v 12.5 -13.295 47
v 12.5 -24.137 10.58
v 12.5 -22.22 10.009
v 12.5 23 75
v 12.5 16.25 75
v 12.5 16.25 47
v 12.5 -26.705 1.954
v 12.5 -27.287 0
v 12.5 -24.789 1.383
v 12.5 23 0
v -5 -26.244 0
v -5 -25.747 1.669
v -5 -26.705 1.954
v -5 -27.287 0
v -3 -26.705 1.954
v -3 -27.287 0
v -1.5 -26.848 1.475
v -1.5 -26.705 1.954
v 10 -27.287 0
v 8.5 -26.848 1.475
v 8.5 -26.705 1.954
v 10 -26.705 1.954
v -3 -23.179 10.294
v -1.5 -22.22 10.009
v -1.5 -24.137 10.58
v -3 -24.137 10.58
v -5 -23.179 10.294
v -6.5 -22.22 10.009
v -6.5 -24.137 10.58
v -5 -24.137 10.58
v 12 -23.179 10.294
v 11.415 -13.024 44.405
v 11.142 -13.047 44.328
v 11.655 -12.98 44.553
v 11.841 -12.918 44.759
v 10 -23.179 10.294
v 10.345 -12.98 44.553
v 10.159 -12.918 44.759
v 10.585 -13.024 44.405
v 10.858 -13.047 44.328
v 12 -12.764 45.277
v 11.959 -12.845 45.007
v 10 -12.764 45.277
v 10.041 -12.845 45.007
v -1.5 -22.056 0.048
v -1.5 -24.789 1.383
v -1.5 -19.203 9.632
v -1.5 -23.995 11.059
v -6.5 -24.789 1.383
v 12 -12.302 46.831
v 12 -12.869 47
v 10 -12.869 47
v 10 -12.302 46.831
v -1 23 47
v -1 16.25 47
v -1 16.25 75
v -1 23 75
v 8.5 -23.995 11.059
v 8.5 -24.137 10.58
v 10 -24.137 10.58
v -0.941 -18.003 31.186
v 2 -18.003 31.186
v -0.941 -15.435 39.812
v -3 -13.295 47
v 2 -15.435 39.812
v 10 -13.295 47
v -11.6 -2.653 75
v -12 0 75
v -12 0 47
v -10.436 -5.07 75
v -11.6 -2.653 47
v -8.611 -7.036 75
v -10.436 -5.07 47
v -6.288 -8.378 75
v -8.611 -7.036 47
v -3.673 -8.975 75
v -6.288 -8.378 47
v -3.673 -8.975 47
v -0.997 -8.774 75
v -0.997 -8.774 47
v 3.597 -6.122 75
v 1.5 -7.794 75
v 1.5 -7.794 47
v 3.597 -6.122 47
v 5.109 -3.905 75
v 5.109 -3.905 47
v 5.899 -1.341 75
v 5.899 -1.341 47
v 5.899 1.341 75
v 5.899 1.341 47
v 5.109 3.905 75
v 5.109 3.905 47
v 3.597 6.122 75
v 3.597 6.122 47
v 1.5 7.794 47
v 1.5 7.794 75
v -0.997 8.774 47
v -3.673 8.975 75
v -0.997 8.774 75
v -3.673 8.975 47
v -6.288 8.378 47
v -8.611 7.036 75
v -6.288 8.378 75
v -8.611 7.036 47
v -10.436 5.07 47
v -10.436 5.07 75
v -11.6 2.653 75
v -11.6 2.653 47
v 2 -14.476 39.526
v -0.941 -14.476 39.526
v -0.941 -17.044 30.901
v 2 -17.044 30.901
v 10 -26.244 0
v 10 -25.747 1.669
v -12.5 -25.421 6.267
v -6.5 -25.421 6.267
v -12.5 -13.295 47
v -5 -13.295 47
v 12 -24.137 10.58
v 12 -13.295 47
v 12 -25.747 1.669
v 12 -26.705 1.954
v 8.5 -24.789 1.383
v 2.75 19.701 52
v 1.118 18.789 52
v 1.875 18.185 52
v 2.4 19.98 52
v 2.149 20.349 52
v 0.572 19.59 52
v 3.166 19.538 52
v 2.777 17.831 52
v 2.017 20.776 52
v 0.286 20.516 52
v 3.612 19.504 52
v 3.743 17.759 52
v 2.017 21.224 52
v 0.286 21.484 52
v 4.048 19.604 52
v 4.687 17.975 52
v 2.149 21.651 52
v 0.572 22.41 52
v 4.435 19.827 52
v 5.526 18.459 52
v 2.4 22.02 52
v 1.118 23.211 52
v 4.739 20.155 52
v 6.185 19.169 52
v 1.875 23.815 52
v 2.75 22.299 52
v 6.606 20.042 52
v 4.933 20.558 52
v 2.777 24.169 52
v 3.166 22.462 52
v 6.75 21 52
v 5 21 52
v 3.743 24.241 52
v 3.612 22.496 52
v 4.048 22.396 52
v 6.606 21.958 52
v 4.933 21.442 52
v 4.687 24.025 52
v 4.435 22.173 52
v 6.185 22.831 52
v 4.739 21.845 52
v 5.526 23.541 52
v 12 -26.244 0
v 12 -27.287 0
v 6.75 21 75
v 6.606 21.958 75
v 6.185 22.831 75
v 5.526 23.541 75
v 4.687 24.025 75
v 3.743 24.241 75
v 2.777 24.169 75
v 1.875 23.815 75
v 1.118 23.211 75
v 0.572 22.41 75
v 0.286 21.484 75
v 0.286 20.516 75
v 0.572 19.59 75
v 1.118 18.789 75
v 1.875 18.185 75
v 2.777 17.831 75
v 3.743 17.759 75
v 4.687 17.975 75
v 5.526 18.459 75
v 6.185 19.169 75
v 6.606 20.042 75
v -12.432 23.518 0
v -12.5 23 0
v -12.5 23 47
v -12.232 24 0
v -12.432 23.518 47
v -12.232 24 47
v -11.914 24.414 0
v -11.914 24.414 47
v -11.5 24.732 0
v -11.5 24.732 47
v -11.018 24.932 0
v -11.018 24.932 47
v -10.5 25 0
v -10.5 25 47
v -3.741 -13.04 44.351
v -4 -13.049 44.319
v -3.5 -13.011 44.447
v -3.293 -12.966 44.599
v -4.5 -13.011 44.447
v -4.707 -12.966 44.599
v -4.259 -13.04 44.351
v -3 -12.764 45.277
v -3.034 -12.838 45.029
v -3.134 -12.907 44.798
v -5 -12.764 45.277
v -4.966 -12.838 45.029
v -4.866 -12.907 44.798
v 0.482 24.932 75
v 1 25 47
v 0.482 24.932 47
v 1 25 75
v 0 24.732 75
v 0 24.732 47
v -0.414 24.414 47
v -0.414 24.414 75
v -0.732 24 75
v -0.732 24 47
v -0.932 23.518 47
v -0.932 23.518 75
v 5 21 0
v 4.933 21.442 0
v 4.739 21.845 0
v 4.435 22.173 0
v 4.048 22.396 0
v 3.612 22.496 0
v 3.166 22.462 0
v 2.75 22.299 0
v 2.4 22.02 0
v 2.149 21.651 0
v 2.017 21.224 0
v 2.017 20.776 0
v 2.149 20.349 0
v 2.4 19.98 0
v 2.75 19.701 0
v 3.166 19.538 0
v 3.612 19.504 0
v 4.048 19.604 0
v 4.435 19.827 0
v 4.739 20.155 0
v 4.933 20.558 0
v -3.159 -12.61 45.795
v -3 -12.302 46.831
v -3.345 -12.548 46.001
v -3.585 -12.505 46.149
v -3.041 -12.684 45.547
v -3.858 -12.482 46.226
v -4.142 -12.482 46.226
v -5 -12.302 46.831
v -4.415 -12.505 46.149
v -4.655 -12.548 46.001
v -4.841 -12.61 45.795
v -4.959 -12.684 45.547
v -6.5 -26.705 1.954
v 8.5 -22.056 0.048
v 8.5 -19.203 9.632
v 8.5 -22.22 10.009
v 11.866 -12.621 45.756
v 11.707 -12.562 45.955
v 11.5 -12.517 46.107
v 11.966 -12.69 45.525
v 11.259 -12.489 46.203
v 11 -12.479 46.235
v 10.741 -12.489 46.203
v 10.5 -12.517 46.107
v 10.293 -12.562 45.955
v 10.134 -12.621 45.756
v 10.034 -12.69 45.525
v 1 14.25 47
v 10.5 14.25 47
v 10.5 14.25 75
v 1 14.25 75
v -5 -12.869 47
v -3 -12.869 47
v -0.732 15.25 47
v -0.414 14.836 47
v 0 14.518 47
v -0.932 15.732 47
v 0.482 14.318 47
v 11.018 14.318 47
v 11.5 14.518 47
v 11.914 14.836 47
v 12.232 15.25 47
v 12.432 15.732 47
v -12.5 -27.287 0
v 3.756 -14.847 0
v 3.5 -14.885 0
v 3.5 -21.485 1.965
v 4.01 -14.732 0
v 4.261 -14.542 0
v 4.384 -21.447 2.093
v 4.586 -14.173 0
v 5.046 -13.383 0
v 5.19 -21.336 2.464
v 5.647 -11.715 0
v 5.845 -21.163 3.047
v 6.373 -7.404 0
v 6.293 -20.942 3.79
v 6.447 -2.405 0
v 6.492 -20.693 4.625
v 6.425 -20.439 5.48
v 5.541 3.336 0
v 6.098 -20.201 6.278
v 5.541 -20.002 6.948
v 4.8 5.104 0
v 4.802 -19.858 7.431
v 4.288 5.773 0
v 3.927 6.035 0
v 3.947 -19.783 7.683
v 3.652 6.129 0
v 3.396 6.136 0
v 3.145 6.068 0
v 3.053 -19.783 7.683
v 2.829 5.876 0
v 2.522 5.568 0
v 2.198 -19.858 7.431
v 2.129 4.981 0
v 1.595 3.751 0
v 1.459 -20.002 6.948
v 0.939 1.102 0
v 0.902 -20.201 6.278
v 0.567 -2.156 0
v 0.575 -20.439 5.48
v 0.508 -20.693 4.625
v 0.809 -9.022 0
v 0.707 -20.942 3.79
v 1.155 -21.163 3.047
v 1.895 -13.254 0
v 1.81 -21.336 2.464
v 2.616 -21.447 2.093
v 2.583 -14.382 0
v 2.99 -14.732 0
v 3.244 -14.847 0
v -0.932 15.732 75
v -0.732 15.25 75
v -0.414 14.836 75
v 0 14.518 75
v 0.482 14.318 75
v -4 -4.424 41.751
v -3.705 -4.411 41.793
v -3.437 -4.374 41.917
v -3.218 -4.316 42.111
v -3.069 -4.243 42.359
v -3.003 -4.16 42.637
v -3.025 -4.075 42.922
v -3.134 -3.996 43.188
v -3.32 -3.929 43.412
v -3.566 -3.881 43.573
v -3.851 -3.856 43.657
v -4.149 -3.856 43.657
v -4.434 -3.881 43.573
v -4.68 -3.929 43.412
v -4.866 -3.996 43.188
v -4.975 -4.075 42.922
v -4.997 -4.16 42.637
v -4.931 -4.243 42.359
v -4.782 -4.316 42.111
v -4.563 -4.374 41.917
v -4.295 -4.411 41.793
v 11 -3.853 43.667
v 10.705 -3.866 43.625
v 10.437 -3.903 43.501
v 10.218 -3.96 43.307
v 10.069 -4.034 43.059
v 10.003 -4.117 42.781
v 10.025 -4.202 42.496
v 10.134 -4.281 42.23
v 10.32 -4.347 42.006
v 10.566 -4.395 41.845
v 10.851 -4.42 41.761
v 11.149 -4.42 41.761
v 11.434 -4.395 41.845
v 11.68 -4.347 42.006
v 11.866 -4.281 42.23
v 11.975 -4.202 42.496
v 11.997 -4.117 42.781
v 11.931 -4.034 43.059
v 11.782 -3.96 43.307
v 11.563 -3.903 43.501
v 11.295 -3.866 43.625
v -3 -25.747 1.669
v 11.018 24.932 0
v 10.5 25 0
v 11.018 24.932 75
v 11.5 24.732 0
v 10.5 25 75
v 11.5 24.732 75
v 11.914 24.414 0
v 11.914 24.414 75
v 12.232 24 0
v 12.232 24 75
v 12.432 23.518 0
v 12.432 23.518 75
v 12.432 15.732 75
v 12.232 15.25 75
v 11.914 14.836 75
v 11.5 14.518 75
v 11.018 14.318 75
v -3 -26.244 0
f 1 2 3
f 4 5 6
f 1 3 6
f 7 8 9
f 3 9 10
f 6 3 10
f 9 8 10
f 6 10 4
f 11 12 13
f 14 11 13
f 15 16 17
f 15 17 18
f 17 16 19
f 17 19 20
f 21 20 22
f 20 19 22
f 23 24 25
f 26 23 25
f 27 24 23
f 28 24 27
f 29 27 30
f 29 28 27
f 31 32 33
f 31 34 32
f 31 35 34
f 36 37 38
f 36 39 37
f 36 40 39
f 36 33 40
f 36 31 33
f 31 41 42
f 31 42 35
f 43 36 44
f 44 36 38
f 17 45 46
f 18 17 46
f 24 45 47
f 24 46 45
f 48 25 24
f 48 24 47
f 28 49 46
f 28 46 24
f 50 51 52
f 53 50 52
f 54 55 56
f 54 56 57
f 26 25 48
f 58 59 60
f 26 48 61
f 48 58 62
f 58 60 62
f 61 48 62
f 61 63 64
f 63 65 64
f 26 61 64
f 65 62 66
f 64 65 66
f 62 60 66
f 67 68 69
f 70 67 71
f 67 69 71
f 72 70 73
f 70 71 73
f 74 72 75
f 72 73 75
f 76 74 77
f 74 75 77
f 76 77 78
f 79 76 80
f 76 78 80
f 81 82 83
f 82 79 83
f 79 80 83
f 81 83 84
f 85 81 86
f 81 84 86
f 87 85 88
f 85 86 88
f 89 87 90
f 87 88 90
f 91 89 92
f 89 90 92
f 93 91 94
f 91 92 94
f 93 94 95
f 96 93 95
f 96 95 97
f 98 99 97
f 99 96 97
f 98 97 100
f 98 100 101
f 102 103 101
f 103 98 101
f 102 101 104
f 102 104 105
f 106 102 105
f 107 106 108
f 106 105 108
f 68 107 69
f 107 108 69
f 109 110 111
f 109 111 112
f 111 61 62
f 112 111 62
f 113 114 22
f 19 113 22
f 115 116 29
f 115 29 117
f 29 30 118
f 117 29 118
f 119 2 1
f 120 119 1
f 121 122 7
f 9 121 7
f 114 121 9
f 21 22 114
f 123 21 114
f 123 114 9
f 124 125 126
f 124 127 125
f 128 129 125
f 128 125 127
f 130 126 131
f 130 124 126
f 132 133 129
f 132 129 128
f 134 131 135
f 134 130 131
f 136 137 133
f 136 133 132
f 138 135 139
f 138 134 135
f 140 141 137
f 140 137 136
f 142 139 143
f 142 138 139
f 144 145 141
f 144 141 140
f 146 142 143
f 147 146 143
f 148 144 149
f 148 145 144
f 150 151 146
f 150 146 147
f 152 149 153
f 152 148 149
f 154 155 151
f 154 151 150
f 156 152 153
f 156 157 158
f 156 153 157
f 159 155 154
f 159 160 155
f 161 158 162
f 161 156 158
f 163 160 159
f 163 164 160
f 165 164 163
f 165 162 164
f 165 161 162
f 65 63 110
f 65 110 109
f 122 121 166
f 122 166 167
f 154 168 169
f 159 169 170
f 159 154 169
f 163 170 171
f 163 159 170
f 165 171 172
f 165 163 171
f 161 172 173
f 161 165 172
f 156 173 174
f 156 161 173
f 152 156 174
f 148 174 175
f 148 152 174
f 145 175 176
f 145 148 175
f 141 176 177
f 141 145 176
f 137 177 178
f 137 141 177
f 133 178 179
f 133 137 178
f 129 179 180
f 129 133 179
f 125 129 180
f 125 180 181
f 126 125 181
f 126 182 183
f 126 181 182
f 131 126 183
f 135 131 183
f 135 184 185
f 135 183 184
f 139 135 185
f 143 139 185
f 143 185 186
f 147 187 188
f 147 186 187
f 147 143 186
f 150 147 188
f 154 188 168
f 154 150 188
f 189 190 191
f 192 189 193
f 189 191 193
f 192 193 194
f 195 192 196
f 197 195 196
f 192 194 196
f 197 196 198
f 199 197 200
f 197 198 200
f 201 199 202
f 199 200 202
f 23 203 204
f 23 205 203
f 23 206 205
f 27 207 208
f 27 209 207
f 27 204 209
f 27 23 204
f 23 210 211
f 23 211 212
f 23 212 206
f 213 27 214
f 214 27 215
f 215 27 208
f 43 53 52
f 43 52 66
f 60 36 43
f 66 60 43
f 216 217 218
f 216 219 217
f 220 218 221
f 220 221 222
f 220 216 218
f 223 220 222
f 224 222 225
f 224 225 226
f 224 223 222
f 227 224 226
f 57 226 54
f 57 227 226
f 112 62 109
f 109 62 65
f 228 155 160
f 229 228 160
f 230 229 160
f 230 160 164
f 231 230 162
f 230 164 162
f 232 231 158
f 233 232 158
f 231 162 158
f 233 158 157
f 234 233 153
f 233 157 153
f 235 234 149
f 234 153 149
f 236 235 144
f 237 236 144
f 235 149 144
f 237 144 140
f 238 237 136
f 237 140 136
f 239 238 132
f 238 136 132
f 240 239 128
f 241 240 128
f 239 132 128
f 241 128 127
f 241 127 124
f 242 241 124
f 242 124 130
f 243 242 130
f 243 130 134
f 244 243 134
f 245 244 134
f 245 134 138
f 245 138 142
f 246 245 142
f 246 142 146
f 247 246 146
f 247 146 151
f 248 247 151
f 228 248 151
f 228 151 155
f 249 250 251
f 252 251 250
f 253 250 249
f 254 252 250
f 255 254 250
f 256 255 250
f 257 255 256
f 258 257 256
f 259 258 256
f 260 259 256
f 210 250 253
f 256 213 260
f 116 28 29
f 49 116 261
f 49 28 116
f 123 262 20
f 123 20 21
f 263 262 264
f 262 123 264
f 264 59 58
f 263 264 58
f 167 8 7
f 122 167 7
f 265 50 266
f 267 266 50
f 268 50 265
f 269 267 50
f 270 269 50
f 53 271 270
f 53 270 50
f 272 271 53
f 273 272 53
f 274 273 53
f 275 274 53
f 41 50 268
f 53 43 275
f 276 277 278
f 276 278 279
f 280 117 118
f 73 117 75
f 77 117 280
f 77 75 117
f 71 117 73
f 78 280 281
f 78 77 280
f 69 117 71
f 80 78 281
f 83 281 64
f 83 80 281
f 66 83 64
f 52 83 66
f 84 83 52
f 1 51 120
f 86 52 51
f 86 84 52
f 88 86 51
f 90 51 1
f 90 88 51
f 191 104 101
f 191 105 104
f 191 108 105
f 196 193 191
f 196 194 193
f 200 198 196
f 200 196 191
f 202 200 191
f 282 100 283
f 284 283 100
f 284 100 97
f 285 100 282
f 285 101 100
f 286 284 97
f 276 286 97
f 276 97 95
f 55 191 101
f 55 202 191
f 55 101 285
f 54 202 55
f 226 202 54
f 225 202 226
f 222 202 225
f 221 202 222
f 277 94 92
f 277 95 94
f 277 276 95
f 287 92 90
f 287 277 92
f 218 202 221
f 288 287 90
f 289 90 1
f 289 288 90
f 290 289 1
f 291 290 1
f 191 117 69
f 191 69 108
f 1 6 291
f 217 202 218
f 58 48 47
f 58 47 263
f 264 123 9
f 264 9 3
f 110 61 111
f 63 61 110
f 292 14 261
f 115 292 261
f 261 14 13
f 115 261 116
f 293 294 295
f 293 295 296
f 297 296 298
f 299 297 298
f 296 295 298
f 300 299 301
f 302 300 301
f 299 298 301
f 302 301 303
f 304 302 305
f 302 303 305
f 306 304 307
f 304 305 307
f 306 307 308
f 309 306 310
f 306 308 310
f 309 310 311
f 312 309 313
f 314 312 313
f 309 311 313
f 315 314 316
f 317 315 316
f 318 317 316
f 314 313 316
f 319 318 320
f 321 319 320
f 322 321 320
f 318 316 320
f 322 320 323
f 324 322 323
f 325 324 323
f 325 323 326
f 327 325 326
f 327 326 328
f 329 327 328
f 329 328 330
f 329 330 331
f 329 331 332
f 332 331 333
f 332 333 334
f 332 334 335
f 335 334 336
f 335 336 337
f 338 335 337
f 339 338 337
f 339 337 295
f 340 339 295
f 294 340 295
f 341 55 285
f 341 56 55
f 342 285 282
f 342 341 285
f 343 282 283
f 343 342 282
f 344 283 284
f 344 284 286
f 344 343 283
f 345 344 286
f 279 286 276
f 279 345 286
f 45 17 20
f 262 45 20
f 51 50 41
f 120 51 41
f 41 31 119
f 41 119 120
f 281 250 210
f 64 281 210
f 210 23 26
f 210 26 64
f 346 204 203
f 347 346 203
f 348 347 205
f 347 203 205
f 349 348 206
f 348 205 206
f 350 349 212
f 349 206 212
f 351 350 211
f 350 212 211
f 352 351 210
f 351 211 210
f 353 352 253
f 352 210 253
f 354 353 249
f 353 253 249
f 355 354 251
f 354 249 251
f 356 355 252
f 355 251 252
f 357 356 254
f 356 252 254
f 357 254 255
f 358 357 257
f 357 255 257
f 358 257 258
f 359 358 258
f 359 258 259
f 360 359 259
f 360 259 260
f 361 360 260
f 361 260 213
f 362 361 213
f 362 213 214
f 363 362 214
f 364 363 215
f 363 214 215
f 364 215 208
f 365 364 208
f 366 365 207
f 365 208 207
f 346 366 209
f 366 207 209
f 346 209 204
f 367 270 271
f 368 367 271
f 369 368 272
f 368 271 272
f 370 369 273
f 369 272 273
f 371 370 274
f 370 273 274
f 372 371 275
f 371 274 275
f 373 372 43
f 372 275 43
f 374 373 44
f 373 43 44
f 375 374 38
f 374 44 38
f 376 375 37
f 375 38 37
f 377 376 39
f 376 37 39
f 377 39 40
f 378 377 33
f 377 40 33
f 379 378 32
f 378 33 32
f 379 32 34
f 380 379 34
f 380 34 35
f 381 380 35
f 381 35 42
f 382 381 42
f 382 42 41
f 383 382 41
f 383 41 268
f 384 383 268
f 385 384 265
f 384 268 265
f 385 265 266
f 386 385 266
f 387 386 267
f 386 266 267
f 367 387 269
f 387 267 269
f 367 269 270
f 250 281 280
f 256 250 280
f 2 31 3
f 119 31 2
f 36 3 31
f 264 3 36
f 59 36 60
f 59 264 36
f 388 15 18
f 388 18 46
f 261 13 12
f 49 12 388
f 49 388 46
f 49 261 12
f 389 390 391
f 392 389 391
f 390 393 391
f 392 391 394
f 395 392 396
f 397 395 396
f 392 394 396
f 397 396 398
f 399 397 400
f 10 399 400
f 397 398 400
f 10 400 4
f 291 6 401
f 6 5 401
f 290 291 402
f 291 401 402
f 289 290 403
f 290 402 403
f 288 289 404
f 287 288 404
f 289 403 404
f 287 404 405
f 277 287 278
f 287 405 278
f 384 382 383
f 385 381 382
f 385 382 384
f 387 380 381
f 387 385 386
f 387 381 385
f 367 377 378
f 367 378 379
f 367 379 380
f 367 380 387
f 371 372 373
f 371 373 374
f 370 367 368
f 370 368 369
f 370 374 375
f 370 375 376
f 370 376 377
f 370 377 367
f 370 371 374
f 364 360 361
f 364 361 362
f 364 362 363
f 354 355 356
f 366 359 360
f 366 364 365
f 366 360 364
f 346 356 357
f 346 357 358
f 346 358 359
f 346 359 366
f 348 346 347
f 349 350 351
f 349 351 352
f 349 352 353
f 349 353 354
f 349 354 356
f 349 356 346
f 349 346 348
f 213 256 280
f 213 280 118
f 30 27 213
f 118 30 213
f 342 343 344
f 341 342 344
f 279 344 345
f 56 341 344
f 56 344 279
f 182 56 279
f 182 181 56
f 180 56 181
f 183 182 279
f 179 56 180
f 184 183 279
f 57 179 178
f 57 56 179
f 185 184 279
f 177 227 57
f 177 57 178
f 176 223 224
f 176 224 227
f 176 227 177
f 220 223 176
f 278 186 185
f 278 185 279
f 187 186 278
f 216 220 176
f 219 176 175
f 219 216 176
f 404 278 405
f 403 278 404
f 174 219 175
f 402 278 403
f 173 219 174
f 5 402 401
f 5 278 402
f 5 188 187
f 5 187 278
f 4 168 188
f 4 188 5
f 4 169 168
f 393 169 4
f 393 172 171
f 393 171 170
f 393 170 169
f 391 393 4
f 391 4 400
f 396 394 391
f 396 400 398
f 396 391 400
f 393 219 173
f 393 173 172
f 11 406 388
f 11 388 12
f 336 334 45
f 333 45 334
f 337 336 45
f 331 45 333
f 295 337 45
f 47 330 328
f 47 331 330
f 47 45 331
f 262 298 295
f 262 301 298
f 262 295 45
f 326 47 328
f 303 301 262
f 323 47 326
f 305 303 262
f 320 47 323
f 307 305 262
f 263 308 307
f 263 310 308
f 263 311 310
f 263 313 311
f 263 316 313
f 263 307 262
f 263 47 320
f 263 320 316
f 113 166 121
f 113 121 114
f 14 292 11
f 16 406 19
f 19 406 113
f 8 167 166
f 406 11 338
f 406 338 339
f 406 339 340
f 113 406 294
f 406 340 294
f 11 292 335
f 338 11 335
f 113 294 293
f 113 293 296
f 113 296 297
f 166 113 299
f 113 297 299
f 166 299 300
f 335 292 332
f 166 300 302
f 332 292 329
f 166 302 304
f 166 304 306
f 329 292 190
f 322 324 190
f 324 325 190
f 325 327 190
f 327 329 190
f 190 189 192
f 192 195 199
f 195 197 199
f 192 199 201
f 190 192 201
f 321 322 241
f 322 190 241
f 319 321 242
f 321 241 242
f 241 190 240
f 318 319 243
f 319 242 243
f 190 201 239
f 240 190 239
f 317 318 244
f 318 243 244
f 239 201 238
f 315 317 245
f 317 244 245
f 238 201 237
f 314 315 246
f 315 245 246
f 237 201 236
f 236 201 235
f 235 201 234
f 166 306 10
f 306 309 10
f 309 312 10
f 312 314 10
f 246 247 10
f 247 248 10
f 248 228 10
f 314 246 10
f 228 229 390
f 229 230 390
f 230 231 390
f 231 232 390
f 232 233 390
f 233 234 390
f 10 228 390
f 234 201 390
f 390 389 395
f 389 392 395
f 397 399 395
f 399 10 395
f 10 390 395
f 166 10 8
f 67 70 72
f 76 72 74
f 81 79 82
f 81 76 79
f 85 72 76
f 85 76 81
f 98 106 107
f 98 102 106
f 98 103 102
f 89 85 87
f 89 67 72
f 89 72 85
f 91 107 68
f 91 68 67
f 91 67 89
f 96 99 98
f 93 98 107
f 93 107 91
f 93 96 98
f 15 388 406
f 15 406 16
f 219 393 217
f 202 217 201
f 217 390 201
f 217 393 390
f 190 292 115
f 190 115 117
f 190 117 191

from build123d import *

# Parameters (mm, degrees)
SKETCH_1_W               = 25
SKETCH_1_H               = 60
EXTRUDE_1_DEPTH          = 75
SKETCH_3_R               = 9
CUT_EXTRUDE_1_DEPTH      = 58.142366069
SKETCH_4_R               = 3.25
CUT_EXTRUDE_2_DEPTH      = 62.320877358
SKETCH_5_R               = 1.5
CUT_EXTRUDE_3_DEPTH      = 62.320877358
SKETCH_6_W               = 25
SKETCH_6_H               = 5
CUT_EXTRUDE_4_DEPTH      = 82.738913621
CUT_EXTRUDE_5_DEPTH      = 85.557672626
SKETCH_9_R               = 3
CUT_EXTRUDE_6_DEPTH      = 85.994924721
SKETCH_10_W              = 10
SKETCH_10_H              = 10
CUT_EXTRUDE_7_DEPTH      = 5
CUT_EXTRUDE_8_DEPTH      = 15
CUT_EXTRUDE_8_DEPTH_BACK = 5
SKETCH_12_R              = 1
CUT_EXTRUDE_9_DEPTH      = 10
SKETCH_14_W              = 2
SKETCH_14_H              = 1
CUT_EXTRUDE_10_DEPTH     = 49.16
SKETCH_15_W              = 2.940527474
SKETCH_15_H              = 9
CUT_EXTRUDE_11_DEPTH     = 1
FILLET_1_R               = 2


with BuildPart() as part:
    # Эскиз1 → Бобышка-Вытянуть1 (new body)
    with BuildSketch(Plane.XY):
        Rectangle(SKETCH_1_W, SKETCH_1_H)
    extrude(amount=EXTRUDE_1_DEPTH)

    # Эскиз3 → Вырез-Вытянуть1 (cut, through all)
    with BuildSketch(Plane.XY.offset(47)):
        Polygon((-12.5, -30), (12.5, -30), (12.5, 14.25), (-1, 14.25), (-1, 30), (-12.5, 30), align=None)
        with Locations(Location((-3, 0, 0), (0, 0, 180))):
            Circle(SKETCH_3_R, mode=Mode.SUBTRACT)
    extrude(amount=CUT_EXTRUDE_1_DEPTH, mode=Mode.SUBTRACT)

    # Эскиз4 → Вырез-Вытянуть2 (cut, through all)
    with BuildSketch(Plane.XY.offset(52)):
        with Locations((3.5, 21)):
            Circle(SKETCH_4_R)
    extrude(amount=CUT_EXTRUDE_2_DEPTH, mode=Mode.SUBTRACT)

    # Эскиз5 → Вырез-Вытянуть3 (cut, through all)
    with BuildSketch(Plane.XY.offset(52)):
        with Locations((3.5, 21)):
            Circle(SKETCH_5_R)
    extrude(amount=-CUT_EXTRUDE_3_DEPTH, mode=Mode.SUBTRACT)

    # Эскиз6 → Вырез-Вытянуть4 (cut, through all)
    with BuildSketch(Plane(origin=(0, 0, 0), x_dir=(-1, 0, 0), z_dir=(0, 0, -1))):
        with Locations((0, 27.5)):
            Rectangle(SKETCH_6_W, SKETCH_6_H)
    extrude(amount=-CUT_EXTRUDE_4_DEPTH, mode=Mode.SUBTRACT)

    # Эскиз8 → Вырез-Вытянуть5 (cut, through all)
    with BuildSketch(Plane(origin=(12.5, 0, 0), x_dir=(0, 0, -1), z_dir=(1, 0, 0))):
        Polygon((-6.266839037, -25.421365839), (-47, -13.294552658), (-47, -30), (0, -30), (0, -27.287088617), align=None)
    extrude(amount=-CUT_EXTRUDE_5_DEPTH, mode=Mode.SUBTRACT)

    # Эскиз9 → Вырез-Вытянуть6 (cut, through all)
    with BuildSketch(Plane(origin=(0, -25.065453583, 7.462324694), x_dir=(1, 0, 0), z_dir=(0, -0.9584273167859609, 0.2853367807319331))):
        with Locations(Location((3.5, -1.247340968, 0), (0, 0, 270))):
            Circle(SKETCH_9_R)
    extrude(amount=-CUT_EXTRUDE_6_DEPTH, mode=Mode.SUBTRACT)

    # Эскиз10 → Вырез-Вытянуть7 (cut)
    with BuildSketch(Plane(origin=(0, -25.065453583, 7.462324694), x_dir=(1, 0, 0), z_dir=(0, -0.9584273167859609, 0.2853367807319331))):
        with Locations((3.5, -1.247340968)):
            Rectangle(SKETCH_10_W, SKETCH_10_H)
    extrude(amount=-CUT_EXTRUDE_7_DEPTH, mode=Mode.SUBTRACT)

    # Эскиз11 → Вырез-Вытянуть8 (cut, two sides: drawn at the far end of the back side and taken through both)
    with BuildSketch(Plane(origin=(-1.5, 0, 0), x_dir=(0, 0, -1), z_dir=(1, 0, 0)).offset(-CUT_EXTRUDE_8_DEPTH_BACK)):
        Polygon((-10.579761962, -24.137350326), (-1.953916111, -26.705381353), (-1.38324255, -24.788526719), (-10.009088401, -22.220495692), align=None)
    extrude(amount=CUT_EXTRUDE_8_DEPTH + CUT_EXTRUDE_8_DEPTH_BACK, mode=Mode.SUBTRACT)

    # Эскиз12 → Вырез-Вытянуть9 (cut)
    with BuildSketch(Plane(origin=(0, -25.065453583, 7.462324694), x_dir=(1, 0, 0), z_dir=(0, -0.9584273167859609, 0.2853367807319331))):
        with Locations(Location((-4, 39.752659032, 0), (0, 0, 270))):
            Circle(SKETCH_12_R)
        with Locations(Location((11, 39.752659032, 0), (0, 0, 90))):
            Circle(SKETCH_12_R)
    extrude(amount=-CUT_EXTRUDE_9_DEPTH, mode=Mode.SUBTRACT)

    # Эскиз14 → Вырез-Вытянуть10 (cut)
    with BuildSketch(Plane(origin=(0, -55.116213781, 8.285107119), x_dir=(-1, 0, 0), z_dir=(0, 0.285336780731933, 0.9584273167859609))):
        with Locations((4, -29.536239553)):
            Rectangle(SKETCH_14_W, SKETCH_14_H)
        with Locations((-11, -29.536239553)):
            Rectangle(SKETCH_14_W, SKETCH_14_H)
    extrude(amount=CUT_EXTRUDE_10_DEPTH, mode=Mode.SUBTRACT)

    # Эскиз15 → Вырез-Вытянуть11 (cut)
    with BuildSketch(Plane(origin=(0, -25.065453583, 7.462324694), x_dir=(1, 0, 0), z_dir=(0, -0.9584273167859609, 0.2853367807319331))):
        with Locations((0.529736263, 29.252659032)):
            Rectangle(SKETCH_15_W, SKETCH_15_H)
    extrude(amount=-CUT_EXTRUDE_11_DEPTH, mode=Mode.SUBTRACT)

    # Скругление1
    fillet_1_edges = [part.edges().sort_by_distance(p)[0] for p in [
        (12.5, 14.25, 61),
        (-1, 14.25, 61),
        (-1, 25, 61),
        (-12.5, 25, 23.5),
        (12.5, 25, 37.5),
    ]]
    fillet(fillet_1_edges, radius=FILLET_1_R)


solid = part.part
